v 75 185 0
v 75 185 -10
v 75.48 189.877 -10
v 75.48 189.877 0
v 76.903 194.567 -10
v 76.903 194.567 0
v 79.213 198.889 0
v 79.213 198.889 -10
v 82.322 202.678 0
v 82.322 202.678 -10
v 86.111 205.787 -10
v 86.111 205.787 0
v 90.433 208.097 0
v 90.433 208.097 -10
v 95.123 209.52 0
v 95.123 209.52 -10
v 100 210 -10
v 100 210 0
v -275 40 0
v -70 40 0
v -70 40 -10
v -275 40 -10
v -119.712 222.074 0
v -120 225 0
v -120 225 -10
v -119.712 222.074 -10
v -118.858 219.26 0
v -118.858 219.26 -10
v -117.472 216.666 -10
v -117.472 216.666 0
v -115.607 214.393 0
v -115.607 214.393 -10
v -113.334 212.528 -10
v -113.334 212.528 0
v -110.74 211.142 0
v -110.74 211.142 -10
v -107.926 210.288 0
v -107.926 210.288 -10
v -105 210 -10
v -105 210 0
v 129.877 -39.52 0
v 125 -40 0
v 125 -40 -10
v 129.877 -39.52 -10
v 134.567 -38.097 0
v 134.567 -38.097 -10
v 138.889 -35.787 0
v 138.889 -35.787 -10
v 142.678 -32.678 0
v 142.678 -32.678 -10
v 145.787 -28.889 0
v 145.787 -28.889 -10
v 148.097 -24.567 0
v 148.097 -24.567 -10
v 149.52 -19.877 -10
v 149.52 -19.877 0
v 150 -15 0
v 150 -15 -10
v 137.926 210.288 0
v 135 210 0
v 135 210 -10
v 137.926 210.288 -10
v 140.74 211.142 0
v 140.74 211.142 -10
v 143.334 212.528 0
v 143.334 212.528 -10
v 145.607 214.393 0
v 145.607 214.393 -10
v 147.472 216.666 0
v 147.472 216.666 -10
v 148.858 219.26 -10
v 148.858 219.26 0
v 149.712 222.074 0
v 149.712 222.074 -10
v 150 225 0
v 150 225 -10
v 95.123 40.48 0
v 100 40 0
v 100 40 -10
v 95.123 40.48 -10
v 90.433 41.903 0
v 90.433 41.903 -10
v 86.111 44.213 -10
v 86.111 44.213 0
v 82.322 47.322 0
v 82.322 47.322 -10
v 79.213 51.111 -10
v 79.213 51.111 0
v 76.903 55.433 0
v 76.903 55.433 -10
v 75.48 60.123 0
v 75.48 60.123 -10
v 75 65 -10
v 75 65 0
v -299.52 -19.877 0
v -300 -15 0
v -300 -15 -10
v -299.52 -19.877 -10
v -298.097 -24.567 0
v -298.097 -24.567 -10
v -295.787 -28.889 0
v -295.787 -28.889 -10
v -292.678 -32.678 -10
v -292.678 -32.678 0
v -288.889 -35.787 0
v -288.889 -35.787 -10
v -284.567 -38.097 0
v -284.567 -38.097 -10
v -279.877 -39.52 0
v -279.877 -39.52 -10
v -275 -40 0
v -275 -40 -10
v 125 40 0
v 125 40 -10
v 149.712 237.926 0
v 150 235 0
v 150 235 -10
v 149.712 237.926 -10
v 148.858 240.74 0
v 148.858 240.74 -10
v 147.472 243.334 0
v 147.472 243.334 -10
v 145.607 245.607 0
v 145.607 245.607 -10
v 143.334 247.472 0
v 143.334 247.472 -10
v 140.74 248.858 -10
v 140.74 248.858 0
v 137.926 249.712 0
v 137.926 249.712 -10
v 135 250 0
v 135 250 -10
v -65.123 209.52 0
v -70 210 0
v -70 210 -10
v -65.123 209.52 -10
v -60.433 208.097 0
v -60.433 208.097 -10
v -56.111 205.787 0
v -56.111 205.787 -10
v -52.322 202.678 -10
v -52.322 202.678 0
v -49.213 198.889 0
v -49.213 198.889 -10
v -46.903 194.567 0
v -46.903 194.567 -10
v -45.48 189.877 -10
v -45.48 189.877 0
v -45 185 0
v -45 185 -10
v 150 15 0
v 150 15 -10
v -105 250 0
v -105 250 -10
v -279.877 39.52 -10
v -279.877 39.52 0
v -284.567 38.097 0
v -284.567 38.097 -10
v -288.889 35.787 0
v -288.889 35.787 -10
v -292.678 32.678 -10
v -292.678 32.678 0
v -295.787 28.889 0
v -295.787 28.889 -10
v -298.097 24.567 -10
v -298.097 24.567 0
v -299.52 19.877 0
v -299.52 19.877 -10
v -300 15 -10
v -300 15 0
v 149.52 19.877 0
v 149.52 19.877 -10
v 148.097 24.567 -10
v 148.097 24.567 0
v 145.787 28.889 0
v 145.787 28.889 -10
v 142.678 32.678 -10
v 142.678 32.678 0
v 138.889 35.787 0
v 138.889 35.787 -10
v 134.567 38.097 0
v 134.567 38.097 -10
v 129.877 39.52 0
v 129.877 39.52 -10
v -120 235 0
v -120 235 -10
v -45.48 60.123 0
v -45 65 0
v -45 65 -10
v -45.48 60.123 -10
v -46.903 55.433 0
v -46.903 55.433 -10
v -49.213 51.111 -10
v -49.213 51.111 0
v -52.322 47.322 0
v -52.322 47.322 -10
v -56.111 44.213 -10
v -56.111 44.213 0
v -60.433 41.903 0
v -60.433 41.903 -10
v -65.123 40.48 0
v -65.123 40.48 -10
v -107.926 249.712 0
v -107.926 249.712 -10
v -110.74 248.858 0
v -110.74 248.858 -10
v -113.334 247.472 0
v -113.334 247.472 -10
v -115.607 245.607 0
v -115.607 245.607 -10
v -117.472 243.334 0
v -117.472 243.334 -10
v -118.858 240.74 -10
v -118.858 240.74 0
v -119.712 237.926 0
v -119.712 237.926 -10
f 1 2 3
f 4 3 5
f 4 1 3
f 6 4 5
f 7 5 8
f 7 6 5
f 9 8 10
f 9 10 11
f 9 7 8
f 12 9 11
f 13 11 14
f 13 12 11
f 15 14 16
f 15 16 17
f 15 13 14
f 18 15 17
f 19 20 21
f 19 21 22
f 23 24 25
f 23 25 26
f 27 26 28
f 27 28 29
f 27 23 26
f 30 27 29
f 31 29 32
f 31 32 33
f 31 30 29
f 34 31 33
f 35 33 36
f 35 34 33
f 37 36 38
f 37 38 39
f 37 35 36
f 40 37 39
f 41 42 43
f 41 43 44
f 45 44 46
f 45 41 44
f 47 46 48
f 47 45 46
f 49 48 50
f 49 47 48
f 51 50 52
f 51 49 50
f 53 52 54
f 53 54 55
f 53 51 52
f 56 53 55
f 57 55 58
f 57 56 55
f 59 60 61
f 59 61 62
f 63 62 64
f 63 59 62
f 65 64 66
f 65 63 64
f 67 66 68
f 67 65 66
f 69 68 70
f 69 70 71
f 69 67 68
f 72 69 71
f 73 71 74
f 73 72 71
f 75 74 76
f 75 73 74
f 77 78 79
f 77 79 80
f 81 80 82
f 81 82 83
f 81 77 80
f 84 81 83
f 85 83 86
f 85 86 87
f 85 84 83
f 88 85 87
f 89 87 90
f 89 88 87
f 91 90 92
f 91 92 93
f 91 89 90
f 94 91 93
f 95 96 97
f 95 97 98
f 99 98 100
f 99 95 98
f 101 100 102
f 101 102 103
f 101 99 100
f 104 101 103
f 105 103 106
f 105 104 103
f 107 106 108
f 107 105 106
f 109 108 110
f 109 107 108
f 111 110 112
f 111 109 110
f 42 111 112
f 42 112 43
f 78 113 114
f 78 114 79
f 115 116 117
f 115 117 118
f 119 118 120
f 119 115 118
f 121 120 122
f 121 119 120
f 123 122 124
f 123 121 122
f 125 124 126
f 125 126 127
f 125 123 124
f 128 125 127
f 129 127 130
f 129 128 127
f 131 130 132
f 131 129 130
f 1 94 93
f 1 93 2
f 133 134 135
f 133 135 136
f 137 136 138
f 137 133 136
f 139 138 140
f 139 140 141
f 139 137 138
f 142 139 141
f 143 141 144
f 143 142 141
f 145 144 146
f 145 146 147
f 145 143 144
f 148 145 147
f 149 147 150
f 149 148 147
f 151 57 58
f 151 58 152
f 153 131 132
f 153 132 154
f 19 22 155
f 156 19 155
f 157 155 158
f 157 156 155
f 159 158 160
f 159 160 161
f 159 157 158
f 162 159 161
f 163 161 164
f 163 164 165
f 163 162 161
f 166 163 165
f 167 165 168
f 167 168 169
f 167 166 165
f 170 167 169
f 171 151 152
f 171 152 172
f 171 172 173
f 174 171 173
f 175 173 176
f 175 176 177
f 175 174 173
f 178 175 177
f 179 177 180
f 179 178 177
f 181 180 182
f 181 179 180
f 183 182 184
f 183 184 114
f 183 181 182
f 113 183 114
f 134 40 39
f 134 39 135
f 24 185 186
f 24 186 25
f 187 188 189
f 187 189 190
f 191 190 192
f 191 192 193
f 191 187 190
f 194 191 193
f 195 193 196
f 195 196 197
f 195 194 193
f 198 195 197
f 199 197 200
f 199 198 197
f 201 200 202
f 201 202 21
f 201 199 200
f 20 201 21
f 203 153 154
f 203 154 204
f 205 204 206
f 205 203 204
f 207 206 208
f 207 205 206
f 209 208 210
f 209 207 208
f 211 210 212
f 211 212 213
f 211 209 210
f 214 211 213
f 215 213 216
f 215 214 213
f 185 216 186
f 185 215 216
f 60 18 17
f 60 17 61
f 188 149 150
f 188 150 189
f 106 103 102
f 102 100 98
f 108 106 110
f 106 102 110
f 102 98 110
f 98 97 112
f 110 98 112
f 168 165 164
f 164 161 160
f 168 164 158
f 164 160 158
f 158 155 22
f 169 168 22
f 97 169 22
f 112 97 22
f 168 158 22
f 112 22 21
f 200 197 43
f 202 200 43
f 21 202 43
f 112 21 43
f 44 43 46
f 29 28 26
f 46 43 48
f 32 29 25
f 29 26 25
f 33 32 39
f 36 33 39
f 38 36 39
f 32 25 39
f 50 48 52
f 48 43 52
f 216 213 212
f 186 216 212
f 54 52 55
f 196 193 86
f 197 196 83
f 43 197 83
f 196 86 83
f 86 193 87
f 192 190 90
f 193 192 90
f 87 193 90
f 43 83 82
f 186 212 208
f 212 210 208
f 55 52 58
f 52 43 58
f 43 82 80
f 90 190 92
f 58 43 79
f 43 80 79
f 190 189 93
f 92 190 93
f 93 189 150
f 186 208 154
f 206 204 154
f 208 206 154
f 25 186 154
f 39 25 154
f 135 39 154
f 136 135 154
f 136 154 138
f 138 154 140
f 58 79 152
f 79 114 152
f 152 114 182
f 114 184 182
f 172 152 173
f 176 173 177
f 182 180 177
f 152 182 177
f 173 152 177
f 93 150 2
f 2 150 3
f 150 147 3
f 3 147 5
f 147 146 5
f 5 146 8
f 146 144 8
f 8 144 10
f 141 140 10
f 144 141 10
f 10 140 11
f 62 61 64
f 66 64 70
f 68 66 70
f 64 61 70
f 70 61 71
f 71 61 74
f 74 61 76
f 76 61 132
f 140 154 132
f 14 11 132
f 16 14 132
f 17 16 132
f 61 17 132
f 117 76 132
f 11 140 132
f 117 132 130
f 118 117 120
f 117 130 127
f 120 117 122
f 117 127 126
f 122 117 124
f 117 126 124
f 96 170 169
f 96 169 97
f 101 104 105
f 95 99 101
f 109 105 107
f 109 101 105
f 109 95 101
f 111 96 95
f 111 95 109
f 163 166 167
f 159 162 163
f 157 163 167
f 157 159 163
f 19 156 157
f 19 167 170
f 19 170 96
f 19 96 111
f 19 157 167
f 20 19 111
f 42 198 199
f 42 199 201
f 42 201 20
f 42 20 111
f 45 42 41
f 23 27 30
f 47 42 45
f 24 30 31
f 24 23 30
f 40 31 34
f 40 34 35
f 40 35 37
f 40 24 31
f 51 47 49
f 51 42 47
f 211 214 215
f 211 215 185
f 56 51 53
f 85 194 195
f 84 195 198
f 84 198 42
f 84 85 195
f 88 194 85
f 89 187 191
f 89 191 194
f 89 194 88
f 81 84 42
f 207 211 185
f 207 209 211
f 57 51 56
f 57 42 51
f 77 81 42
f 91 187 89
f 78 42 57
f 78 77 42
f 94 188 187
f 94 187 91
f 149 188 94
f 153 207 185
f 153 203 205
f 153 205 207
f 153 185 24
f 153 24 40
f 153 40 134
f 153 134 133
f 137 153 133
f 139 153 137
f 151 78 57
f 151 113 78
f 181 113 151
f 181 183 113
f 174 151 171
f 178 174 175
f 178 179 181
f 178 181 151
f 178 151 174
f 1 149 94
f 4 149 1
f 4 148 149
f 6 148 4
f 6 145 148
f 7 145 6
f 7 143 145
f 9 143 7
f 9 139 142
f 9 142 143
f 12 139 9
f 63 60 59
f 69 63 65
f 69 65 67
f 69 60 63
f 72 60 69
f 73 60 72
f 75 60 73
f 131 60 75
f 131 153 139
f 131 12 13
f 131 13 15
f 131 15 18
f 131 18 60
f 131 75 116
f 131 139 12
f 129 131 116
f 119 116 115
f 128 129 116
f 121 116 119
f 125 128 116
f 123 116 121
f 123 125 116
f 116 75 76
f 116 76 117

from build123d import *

# Parameters (mm, degrees)
F1_DEPTH = 10


with BuildPart() as f1:
    # F0 (on Top) → F1 (new body)
    with BuildSketch(Plane.XY):
        with BuildLine():
            Line((-70, 40), (-120, 40))
            Line((-120, 40), (-275, 40))
            ThreePointArc((-275, 40), (-292.67767, 32.67767), (-300, 15))
            Line((-300, 15), (-300, 0))
            Line((-300, 0), (-300, -15))
            ThreePointArc((-300, -15), (-292.67767, -32.67767), (-275, -40))
            Line((-275, -40), (125, -40))
            ThreePointArc((125, -40), (142.67767, -32.67767), (150, -15))
            Line((150, -15), (150, 15))
            ThreePointArc((150, 15), (142.67767, 32.67767), (125, 40))
            Line((125, 40), (100, 40))
            ThreePointArc((100, 40), (82.32233, 47.32233), (75, 65))
            Line((75, 65), (75, 185))
            ThreePointArc((75, 185), (82.32233, 202.67767), (100, 210))
            Line((100, 210), (135, 210))
            ThreePointArc((135, 210), (145.606602, 214.393398), (150, 225))
            Line((150, 225), (150, 235))
            ThreePointArc((150, 235), (145.606602, 245.606602), (135, 250))
            Line((135, 250), (-105, 250))
            ThreePointArc((-105, 250), (-115.606602, 245.606602), (-120, 235))
            Line((-120, 235), (-120, 225))
            ThreePointArc((-120, 225), (-115.606602, 214.393398), (-105, 210))
            Line((-105, 210), (-70, 210))
            ThreePointArc((-70, 210), (-52.32233, 202.67767), (-45, 185))
            Line((-45, 185), (-45, 65))
            ThreePointArc((-45, 65), (-52.32233, 47.32233), (-70, 40))
        make_face()
    extrude(amount=-F1_DEPTH)


solid = f1.part
